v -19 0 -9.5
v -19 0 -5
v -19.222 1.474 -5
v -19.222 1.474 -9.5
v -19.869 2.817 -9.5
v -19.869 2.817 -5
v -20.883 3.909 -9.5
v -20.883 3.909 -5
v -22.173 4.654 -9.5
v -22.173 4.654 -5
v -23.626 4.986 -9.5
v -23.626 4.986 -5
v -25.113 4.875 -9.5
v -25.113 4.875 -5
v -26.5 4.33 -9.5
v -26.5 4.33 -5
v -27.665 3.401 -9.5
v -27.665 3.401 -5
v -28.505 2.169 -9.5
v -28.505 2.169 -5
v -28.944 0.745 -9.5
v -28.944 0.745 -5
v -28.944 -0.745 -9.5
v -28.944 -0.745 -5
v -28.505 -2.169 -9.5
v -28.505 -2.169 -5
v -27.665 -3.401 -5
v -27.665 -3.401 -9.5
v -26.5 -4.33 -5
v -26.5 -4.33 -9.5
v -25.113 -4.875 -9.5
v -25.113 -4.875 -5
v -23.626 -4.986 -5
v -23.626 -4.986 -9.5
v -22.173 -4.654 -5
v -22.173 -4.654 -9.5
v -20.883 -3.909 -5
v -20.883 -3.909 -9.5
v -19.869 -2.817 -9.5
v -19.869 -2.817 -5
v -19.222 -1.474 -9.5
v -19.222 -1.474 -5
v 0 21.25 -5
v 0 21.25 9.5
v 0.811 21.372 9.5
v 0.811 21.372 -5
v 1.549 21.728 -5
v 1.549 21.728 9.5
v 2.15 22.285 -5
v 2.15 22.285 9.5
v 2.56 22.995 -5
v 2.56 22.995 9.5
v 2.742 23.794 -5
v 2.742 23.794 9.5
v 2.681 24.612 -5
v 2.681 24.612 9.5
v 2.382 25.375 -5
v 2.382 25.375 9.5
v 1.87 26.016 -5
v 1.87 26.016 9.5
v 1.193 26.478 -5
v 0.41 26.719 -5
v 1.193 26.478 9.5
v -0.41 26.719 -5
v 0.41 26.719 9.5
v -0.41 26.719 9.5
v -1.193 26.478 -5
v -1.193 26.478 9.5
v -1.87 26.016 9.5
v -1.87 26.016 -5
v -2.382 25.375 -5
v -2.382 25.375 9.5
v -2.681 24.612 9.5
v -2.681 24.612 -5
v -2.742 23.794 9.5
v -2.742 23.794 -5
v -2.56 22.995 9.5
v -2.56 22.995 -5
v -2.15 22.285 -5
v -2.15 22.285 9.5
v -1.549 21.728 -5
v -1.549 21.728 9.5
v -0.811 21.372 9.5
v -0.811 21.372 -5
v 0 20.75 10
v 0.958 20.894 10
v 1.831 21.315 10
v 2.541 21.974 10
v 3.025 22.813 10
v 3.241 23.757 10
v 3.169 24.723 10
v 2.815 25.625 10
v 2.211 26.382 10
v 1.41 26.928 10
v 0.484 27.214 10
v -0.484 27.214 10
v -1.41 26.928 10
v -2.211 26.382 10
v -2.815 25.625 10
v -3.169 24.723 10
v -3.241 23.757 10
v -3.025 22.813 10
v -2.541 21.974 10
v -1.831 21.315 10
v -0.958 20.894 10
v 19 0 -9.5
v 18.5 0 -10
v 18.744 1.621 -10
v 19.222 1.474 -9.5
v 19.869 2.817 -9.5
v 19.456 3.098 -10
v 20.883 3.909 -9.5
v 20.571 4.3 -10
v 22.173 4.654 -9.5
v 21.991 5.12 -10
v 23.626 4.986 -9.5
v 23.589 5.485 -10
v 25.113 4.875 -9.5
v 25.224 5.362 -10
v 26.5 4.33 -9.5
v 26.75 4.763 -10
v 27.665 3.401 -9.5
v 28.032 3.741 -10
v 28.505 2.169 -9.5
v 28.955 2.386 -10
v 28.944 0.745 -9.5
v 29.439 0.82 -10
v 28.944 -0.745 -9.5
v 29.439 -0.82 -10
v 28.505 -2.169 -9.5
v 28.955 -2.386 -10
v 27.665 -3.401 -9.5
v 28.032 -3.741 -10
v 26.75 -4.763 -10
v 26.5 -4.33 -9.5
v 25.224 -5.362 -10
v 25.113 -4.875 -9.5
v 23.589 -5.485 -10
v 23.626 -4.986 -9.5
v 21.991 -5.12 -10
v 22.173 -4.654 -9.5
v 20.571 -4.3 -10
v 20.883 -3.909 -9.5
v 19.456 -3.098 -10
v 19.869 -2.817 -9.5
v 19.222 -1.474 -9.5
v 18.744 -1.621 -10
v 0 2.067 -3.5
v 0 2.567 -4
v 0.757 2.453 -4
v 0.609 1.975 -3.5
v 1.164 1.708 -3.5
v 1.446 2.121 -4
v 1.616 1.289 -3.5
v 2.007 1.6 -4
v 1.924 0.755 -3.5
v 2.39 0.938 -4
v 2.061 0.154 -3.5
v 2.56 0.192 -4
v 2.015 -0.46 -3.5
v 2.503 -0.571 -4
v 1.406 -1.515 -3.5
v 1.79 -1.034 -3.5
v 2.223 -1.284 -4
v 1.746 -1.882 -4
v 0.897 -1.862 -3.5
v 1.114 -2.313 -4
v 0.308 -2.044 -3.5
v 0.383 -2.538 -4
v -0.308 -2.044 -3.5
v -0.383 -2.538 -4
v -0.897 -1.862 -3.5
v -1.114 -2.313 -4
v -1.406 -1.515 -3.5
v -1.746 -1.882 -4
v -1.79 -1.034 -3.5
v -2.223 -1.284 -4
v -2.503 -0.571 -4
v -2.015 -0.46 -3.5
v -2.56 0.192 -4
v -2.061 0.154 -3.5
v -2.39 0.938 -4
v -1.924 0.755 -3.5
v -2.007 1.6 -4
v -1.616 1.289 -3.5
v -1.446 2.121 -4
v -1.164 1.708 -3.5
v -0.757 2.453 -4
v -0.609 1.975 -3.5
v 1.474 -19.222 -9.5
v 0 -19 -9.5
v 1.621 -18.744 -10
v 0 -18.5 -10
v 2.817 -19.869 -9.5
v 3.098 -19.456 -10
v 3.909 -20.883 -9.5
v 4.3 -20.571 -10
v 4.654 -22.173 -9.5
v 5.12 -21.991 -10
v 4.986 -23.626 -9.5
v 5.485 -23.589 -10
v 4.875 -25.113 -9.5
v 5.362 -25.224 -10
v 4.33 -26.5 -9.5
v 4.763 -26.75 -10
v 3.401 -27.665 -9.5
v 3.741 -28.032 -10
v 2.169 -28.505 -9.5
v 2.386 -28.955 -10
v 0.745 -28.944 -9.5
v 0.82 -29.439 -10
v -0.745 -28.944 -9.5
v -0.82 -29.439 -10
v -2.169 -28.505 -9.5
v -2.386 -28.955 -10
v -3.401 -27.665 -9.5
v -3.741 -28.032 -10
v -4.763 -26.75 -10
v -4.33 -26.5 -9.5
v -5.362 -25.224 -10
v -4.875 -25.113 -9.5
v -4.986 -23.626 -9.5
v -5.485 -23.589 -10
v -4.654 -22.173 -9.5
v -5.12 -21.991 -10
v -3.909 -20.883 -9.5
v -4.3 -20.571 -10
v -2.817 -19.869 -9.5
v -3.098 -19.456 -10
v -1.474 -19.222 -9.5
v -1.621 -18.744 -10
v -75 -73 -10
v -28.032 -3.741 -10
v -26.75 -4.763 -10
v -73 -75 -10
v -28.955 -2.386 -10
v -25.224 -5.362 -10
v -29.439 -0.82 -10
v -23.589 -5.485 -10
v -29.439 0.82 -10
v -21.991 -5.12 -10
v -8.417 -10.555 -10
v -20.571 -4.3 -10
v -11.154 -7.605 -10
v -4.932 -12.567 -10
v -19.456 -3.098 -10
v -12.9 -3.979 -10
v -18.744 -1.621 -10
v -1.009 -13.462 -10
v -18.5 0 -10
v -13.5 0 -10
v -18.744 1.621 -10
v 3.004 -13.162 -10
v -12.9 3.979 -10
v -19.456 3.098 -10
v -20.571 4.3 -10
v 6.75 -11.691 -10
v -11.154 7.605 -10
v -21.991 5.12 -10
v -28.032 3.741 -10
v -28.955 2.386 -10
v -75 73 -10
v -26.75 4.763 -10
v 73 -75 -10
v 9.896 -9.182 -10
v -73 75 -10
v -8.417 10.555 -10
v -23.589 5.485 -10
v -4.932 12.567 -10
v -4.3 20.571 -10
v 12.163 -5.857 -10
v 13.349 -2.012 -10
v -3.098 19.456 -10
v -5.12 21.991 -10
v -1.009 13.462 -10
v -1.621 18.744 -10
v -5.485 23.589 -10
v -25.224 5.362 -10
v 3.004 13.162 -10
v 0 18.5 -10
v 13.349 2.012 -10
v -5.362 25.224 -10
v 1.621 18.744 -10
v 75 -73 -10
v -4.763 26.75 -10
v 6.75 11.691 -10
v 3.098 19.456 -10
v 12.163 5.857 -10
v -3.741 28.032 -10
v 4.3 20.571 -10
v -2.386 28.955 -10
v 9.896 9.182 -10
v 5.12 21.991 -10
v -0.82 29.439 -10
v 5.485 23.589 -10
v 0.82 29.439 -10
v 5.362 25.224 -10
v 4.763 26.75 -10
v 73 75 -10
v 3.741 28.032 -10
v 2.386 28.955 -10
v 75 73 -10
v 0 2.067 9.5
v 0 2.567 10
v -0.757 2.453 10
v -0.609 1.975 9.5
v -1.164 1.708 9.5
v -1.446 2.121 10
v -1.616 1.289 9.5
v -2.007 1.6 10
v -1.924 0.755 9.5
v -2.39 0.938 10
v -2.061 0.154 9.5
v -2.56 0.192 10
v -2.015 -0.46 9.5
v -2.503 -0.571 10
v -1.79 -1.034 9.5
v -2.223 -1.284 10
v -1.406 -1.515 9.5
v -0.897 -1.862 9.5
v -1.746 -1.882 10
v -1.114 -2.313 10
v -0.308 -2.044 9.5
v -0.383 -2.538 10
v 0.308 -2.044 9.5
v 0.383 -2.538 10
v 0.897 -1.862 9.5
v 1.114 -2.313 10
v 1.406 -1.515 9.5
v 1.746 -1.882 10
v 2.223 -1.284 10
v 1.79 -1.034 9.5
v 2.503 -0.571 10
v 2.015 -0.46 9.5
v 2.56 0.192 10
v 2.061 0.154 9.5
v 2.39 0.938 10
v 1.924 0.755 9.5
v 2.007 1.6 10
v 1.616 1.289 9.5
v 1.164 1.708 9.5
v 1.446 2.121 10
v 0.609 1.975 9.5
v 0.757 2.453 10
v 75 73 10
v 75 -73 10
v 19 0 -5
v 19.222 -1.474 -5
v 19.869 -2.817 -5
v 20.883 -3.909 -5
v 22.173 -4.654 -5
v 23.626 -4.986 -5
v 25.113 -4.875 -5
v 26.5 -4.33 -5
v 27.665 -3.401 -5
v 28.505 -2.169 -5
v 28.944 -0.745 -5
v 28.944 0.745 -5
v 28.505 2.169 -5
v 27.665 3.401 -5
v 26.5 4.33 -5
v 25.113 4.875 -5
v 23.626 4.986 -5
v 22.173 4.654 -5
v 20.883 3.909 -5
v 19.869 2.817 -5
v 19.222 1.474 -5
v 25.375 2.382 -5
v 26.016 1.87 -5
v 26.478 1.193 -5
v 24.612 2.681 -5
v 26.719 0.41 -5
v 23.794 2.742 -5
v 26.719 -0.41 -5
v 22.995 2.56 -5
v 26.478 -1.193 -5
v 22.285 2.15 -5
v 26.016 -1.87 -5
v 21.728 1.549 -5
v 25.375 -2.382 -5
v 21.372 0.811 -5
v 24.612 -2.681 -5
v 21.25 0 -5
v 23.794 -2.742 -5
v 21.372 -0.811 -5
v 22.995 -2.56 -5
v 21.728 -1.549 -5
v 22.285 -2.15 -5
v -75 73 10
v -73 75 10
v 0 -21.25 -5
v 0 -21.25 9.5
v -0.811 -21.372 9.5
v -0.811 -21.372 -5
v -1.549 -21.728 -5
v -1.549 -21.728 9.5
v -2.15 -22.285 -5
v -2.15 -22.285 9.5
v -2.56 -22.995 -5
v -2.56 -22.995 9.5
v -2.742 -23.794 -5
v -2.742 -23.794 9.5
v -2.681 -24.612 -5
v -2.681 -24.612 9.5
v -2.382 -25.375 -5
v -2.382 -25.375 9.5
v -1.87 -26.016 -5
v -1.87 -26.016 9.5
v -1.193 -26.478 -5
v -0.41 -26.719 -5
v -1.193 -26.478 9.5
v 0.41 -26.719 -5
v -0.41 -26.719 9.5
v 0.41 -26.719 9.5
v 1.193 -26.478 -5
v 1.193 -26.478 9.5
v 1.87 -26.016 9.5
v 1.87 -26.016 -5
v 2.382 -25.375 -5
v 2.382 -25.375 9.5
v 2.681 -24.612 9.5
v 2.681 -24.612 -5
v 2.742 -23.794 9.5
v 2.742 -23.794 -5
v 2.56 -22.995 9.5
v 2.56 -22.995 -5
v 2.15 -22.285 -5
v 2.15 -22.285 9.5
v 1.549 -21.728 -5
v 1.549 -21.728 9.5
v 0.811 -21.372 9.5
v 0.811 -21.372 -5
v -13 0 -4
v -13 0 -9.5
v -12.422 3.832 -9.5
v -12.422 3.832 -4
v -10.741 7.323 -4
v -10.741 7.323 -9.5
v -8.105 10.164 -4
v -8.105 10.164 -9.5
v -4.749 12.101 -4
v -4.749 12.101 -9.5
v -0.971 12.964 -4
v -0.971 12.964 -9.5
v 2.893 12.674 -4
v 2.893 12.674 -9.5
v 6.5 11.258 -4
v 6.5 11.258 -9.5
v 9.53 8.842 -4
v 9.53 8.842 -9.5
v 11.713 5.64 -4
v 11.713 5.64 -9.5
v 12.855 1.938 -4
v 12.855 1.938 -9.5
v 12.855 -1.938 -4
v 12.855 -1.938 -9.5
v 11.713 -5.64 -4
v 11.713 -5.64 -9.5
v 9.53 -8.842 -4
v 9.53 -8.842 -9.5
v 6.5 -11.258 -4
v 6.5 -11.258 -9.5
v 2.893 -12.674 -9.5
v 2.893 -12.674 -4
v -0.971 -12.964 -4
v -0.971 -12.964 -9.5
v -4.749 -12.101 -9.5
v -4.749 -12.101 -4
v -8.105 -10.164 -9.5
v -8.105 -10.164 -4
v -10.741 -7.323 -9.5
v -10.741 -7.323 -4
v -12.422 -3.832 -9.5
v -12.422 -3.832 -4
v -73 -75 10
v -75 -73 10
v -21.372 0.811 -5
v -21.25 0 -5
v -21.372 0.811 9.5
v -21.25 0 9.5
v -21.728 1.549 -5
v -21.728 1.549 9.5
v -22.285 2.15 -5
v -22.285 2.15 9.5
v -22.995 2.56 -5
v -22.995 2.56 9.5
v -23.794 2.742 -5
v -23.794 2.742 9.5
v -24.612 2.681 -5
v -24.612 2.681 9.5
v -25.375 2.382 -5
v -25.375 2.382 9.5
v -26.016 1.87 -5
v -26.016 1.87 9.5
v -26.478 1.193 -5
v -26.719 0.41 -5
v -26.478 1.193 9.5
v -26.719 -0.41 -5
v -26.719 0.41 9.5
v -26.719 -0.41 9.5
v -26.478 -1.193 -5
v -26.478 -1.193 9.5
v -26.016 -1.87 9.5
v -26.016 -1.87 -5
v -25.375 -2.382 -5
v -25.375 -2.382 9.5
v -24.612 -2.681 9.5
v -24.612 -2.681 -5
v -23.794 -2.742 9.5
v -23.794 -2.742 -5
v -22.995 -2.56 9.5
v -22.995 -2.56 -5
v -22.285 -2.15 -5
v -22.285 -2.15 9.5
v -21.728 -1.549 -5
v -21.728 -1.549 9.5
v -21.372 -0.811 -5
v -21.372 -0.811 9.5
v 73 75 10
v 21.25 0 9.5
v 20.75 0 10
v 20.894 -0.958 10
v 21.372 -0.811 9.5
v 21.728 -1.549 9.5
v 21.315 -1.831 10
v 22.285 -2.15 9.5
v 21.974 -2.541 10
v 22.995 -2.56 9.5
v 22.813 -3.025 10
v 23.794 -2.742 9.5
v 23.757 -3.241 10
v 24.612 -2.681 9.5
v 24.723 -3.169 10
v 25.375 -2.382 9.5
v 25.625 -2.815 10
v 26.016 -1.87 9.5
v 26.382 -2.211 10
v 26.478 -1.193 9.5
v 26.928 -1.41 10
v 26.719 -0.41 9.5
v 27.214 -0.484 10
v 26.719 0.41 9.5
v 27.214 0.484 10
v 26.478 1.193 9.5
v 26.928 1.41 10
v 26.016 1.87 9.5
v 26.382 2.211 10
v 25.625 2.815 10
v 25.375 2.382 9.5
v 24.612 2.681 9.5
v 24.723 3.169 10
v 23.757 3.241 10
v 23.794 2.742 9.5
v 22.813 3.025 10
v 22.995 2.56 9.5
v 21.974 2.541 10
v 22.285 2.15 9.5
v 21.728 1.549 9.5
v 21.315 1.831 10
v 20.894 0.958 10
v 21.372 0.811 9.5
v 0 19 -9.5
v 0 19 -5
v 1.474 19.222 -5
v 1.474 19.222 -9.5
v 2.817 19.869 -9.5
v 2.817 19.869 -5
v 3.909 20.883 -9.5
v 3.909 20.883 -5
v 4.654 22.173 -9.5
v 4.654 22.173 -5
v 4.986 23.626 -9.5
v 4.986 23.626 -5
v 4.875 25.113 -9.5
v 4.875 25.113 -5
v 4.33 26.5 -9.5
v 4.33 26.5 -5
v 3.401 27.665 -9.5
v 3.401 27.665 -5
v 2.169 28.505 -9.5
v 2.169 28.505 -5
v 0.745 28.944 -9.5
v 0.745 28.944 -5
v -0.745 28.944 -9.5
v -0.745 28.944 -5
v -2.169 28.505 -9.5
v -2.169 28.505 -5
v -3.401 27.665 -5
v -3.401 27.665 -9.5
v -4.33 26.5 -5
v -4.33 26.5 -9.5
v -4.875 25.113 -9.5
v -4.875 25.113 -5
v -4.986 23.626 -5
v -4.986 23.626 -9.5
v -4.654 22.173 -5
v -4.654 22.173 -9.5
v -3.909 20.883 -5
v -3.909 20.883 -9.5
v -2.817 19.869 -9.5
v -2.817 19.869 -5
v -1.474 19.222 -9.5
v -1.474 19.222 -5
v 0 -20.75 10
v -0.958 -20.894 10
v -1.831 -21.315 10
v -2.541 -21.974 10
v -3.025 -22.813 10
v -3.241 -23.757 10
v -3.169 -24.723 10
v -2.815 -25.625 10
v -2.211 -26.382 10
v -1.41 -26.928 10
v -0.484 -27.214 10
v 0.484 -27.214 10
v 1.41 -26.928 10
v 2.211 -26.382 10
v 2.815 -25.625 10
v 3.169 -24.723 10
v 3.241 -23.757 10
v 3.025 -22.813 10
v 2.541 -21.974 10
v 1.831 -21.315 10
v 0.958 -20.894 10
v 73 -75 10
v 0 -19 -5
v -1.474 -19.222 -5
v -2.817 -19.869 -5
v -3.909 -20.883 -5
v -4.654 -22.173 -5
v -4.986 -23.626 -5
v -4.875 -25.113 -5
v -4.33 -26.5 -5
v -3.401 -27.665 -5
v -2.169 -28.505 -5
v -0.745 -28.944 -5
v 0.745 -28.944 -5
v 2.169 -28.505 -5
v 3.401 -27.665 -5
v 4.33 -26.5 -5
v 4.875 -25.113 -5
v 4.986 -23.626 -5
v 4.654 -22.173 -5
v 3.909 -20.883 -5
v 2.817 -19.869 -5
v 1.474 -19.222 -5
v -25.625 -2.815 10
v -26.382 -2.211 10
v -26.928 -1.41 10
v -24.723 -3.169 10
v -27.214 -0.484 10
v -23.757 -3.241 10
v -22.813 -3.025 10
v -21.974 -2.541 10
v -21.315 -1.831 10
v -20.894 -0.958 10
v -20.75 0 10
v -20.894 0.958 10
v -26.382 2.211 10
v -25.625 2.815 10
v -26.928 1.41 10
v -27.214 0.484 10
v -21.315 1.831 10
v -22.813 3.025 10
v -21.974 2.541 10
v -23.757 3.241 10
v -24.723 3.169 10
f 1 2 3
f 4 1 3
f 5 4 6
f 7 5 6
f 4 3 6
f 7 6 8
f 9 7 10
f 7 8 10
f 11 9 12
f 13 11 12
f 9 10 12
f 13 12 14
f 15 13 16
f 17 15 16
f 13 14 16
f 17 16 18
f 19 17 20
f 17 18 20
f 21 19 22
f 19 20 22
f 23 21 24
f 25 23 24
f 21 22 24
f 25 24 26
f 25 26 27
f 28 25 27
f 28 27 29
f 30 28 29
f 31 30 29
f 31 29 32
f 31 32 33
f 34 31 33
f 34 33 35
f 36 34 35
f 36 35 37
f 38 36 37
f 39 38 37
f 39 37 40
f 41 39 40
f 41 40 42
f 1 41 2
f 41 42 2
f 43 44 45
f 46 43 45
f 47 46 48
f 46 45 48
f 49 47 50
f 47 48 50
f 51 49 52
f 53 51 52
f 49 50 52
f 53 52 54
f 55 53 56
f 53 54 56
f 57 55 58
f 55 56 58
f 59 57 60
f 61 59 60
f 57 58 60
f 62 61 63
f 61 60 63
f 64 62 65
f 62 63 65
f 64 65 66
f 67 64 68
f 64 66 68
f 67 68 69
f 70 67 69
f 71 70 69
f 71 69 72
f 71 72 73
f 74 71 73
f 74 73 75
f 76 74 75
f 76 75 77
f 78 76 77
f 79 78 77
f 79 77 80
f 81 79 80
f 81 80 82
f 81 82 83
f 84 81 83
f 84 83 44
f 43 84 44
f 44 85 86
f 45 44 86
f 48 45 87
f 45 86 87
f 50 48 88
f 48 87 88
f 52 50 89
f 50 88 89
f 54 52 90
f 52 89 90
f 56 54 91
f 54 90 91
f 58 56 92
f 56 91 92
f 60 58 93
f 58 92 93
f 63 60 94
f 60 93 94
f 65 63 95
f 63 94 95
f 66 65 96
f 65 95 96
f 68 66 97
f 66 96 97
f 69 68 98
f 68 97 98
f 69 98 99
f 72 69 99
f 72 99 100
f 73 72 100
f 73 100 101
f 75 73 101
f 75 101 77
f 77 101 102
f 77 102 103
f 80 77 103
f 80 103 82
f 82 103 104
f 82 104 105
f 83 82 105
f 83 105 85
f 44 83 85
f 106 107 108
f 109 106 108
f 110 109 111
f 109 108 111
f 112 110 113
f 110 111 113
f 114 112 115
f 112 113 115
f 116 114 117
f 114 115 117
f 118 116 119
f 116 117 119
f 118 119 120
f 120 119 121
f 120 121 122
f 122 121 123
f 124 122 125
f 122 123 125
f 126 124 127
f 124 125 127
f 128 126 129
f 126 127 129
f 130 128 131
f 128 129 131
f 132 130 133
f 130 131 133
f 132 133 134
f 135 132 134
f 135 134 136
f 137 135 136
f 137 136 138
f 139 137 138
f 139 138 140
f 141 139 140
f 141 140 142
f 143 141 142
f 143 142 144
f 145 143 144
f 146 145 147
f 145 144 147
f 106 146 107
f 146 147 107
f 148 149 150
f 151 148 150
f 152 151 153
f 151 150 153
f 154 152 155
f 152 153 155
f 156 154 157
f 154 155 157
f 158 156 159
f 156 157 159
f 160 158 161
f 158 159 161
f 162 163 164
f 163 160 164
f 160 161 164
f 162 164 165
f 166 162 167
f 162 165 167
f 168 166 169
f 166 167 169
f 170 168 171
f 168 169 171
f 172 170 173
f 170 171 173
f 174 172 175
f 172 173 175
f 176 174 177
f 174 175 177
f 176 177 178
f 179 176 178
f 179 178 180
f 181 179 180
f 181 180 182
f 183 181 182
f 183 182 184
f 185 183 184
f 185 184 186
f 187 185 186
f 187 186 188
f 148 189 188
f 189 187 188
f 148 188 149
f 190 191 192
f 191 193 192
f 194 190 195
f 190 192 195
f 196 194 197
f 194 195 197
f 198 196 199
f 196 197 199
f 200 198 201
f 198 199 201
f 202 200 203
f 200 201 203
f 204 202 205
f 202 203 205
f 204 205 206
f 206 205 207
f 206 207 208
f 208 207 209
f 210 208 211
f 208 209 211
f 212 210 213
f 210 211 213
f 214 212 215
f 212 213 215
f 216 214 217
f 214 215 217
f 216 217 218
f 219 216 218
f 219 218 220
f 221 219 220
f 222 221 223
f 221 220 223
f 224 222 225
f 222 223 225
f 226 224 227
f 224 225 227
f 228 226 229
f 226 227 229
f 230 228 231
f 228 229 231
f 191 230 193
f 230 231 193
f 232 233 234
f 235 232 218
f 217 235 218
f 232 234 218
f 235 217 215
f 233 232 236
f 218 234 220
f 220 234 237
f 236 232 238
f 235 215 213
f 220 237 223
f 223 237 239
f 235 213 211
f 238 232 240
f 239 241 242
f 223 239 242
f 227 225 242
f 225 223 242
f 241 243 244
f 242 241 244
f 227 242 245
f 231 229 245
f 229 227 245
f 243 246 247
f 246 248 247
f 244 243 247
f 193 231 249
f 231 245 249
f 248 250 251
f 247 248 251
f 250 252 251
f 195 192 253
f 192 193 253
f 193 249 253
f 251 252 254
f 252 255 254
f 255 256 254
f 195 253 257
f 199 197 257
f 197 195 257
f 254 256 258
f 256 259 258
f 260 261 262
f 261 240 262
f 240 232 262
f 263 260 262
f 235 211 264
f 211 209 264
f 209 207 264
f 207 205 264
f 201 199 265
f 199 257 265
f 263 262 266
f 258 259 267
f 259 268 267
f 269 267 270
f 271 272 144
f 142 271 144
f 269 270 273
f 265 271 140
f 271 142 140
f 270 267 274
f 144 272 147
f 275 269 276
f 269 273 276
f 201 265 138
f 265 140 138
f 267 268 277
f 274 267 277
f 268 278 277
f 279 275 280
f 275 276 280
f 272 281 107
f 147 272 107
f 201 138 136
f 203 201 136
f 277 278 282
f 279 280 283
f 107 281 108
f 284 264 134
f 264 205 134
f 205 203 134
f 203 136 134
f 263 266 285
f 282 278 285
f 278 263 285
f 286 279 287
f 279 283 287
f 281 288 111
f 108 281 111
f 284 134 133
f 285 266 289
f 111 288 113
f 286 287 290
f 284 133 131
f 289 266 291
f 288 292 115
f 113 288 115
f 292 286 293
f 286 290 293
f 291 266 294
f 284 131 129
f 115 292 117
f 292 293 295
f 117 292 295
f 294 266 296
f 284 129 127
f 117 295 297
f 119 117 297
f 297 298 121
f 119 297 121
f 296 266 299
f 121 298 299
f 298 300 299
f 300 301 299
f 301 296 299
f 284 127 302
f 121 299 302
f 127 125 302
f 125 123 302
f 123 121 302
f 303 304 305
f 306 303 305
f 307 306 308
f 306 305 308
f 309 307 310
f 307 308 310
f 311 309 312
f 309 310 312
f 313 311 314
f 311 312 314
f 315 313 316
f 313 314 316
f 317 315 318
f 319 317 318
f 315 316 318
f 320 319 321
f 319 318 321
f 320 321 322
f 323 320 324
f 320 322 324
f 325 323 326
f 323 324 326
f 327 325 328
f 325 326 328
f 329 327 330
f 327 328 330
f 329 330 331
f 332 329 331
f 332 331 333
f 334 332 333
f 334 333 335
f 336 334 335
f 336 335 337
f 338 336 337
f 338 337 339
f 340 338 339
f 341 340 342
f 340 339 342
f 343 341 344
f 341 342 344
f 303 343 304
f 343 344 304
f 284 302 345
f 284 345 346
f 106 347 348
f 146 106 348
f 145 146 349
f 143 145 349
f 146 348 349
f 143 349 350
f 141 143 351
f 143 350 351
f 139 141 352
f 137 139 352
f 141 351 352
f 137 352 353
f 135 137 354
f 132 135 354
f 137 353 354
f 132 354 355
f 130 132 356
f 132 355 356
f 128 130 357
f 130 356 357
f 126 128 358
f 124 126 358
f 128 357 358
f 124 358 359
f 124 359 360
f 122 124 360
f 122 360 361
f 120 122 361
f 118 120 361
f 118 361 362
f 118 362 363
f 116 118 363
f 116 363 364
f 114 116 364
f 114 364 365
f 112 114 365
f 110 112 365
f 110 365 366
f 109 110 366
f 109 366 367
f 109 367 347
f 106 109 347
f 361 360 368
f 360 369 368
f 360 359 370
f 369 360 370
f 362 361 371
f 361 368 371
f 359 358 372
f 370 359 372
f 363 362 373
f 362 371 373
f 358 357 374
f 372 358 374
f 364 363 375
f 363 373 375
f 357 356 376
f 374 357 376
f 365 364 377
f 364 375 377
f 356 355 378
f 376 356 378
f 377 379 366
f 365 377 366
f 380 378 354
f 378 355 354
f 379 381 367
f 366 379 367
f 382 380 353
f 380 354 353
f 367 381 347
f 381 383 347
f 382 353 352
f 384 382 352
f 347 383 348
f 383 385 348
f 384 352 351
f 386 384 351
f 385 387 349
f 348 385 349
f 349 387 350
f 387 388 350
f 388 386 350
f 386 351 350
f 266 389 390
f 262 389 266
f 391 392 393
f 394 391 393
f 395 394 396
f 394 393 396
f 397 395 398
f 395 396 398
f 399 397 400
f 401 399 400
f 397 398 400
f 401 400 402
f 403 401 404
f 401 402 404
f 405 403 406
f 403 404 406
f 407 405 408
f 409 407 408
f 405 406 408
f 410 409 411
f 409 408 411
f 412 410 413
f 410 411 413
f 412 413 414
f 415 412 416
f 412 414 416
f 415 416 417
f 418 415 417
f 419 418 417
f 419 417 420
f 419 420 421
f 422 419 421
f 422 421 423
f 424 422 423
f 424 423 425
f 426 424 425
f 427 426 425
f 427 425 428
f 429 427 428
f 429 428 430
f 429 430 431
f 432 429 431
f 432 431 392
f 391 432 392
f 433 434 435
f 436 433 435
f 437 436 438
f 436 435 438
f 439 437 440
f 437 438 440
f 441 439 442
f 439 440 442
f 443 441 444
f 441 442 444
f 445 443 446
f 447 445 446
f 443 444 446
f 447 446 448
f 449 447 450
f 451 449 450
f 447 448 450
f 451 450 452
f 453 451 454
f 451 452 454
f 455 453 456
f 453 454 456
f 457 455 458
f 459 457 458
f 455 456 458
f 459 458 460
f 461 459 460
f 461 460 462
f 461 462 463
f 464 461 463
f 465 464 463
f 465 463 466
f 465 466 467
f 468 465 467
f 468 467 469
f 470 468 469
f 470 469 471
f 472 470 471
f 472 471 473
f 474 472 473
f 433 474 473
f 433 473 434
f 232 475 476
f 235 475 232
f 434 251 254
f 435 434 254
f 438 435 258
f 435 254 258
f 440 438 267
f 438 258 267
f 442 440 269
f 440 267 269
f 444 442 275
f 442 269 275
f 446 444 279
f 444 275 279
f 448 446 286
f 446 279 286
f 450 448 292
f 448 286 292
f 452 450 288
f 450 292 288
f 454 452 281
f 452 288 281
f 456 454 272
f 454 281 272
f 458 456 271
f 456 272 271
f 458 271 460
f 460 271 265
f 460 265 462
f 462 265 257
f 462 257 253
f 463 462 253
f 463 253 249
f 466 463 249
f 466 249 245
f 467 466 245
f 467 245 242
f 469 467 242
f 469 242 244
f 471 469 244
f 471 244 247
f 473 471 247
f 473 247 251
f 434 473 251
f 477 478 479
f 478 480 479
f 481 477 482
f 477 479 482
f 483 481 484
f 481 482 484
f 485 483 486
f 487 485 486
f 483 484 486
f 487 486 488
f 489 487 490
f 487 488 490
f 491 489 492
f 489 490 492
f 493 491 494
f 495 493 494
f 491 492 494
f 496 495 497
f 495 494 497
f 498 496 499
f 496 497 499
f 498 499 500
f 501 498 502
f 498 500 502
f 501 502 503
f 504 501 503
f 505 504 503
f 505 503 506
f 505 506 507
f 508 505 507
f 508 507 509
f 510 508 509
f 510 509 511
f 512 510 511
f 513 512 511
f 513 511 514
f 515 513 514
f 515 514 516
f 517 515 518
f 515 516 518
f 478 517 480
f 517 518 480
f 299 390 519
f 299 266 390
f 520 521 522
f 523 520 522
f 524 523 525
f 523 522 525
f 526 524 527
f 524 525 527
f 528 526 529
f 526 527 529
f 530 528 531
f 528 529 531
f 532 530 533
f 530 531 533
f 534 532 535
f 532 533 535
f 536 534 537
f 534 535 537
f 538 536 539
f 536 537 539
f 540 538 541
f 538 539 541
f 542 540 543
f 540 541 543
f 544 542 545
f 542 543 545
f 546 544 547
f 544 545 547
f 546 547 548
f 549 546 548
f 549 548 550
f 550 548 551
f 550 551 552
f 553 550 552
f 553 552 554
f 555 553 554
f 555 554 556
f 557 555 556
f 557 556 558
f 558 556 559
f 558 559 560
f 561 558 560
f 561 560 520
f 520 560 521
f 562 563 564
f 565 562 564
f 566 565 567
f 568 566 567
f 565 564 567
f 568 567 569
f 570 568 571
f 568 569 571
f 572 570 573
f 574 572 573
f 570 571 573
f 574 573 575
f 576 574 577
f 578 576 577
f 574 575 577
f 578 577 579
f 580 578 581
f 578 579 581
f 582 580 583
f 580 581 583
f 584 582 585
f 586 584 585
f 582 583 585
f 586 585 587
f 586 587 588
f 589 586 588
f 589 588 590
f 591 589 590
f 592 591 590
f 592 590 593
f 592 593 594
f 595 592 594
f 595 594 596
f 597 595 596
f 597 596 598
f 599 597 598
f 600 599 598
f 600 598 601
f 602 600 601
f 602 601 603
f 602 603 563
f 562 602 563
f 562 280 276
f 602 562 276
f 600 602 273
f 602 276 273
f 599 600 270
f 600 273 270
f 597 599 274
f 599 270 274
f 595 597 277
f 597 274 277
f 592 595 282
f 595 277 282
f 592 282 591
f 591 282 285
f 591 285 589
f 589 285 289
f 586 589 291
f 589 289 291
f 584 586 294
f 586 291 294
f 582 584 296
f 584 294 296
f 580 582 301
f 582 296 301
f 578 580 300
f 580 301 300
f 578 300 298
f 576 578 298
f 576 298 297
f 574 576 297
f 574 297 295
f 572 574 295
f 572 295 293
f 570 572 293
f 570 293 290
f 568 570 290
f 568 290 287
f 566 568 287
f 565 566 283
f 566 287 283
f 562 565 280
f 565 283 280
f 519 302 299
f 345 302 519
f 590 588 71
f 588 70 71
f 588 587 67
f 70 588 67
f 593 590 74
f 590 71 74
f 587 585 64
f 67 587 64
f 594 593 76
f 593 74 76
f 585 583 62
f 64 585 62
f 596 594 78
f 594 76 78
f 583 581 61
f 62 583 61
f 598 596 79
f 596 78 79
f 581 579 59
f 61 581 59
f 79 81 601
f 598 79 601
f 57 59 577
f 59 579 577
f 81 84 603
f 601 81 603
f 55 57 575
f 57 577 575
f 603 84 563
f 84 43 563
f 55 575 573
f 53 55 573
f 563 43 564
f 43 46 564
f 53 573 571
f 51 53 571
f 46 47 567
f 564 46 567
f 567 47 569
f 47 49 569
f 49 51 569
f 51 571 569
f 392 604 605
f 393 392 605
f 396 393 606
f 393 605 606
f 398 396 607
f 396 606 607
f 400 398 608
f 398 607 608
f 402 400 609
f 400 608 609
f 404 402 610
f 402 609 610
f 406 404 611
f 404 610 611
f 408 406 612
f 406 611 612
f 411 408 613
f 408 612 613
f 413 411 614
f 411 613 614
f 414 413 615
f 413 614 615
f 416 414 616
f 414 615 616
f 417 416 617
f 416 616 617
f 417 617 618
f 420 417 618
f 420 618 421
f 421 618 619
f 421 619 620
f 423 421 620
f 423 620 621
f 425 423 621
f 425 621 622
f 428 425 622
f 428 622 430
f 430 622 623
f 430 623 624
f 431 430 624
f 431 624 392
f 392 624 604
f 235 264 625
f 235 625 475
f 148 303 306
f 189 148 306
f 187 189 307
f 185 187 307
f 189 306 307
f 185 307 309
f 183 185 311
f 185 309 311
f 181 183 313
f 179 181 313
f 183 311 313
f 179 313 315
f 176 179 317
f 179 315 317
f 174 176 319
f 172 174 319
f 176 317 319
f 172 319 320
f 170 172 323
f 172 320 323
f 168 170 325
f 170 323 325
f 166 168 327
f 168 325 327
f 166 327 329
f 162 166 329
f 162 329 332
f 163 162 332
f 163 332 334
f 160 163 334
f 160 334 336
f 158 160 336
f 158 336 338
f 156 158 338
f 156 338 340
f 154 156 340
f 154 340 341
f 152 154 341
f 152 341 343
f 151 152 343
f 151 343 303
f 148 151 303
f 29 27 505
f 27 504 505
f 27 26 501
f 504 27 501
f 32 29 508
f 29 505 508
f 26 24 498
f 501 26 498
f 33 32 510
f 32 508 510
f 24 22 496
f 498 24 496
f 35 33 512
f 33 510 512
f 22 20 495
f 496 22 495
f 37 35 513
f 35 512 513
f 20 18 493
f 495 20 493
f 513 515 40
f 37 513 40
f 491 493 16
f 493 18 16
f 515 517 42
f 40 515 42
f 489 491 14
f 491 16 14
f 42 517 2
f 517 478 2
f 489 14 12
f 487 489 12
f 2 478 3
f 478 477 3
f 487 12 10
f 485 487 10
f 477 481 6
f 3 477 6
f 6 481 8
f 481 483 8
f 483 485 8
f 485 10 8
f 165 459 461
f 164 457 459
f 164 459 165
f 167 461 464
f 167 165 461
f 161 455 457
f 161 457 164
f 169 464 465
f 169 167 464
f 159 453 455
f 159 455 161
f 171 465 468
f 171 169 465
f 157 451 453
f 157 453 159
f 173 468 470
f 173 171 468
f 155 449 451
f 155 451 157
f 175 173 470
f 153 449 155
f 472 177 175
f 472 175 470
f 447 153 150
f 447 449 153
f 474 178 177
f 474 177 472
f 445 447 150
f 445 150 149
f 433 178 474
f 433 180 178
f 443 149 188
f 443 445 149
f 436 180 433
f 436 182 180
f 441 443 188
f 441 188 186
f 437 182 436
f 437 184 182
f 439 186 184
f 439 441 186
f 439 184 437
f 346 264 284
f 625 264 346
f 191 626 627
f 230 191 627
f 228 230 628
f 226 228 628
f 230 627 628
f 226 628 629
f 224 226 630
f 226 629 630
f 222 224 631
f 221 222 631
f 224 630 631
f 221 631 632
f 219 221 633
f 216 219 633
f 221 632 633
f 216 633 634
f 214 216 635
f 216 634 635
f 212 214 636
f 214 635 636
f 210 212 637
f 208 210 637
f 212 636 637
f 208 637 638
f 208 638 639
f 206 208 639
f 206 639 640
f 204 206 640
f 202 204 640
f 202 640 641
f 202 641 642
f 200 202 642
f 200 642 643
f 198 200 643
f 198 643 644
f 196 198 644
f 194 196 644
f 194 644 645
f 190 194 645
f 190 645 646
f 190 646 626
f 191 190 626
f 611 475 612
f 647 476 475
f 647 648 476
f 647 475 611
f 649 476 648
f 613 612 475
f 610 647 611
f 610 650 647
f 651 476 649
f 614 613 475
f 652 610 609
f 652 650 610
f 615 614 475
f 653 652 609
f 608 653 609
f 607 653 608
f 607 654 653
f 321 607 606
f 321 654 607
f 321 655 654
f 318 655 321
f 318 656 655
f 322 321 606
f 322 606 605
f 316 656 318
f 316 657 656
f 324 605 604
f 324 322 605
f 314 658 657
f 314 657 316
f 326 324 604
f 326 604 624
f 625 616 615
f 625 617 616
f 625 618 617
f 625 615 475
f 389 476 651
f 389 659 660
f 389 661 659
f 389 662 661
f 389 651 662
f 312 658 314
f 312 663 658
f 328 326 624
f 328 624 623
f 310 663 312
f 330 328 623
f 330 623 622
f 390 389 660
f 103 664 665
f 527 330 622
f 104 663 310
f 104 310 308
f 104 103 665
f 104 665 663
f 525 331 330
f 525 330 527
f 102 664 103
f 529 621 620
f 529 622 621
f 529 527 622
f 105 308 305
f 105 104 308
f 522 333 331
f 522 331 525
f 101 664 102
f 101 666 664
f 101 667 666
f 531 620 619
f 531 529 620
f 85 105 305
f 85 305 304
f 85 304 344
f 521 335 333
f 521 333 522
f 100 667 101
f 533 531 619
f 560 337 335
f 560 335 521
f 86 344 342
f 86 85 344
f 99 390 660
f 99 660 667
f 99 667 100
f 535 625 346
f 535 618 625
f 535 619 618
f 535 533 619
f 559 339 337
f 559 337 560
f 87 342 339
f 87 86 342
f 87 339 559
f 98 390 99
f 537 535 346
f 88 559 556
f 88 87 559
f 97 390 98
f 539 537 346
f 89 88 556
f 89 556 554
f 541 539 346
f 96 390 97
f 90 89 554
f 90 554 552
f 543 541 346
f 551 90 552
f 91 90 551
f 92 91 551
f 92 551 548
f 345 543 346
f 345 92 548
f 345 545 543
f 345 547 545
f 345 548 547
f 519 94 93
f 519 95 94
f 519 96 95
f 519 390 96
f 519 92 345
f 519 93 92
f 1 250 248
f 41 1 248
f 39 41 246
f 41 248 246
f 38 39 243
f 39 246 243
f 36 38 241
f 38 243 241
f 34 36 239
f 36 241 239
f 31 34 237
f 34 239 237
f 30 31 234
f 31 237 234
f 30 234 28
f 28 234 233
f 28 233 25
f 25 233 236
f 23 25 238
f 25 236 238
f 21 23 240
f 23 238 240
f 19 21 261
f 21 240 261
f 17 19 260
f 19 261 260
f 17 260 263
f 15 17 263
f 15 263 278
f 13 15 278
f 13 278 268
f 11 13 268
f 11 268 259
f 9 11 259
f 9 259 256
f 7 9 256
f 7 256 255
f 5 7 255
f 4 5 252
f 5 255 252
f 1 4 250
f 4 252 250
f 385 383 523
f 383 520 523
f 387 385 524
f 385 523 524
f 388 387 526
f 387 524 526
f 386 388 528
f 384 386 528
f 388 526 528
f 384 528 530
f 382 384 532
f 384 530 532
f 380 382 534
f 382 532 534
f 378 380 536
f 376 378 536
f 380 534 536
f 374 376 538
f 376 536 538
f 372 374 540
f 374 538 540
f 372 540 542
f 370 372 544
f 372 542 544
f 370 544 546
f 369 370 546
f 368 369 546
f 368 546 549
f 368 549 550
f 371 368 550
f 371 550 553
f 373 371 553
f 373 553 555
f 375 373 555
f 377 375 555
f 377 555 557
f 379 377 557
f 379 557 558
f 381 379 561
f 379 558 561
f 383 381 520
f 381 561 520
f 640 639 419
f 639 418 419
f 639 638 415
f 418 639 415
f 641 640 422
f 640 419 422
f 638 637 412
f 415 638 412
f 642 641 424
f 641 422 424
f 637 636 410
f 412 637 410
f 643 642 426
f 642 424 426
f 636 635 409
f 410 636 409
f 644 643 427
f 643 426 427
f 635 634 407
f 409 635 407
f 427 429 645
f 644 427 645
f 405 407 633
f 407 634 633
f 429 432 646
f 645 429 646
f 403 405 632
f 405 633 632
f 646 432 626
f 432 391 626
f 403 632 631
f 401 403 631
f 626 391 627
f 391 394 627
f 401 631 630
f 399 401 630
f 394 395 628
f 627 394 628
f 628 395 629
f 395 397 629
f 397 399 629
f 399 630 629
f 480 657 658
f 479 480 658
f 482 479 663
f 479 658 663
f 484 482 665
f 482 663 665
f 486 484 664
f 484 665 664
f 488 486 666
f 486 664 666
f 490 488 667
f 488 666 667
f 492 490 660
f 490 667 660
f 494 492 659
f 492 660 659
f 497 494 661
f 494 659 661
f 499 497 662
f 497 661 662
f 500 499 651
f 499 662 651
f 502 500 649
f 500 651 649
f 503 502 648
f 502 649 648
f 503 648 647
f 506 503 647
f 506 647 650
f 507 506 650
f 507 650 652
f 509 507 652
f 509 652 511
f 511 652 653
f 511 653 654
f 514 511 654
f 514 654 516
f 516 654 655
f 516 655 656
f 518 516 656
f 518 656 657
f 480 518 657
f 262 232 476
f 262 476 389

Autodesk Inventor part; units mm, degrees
ref_plane "XY Plane" through (0, 0, 0) normal (0, 0, 1) x (1, 0, 0)
sketch "Skizze1" plane through (0, 0, 0) normal (0, 0, 1) x (1, 0, 0)
  line L0 (-75, 75) -> (75, 75)
  line L1 (75, 75) -> (75, -75)
  line L2 (75, -75) -> (-75, -75)
  line L3 (-75, -75) -> (-75, 75)
  line L4 (-75, 75) -> (75, -75) construction
  line L5 (75, 75) -> (-75, -75) construction
  point P0 (0, 0)
  dimension "d0" = 150
  dimension "d1" = 150
extrude "Extrusion1" add sketch "Skizze1" along normal mid plane 20
sketch "Skizze5" plane through (0, 0, -10) normal (0, 0, -1) x (-1, 0, 0)
  line L0 (-75, -75) -> (75, -75) projected
  line L1 (75, -75) -> (75, 75) projected
  line L2 (75, 75) -> (-75, 75) projected
  line L3 (-75, 75) -> (-75, -75) projected
  circle A0 centre (0, 0) radius 13
  dimension "d30" = 26
extrude "Extrusion3" cut sketch "Skizze5" against normal blind 6 contours A0
chamfer "Fasen2" distance 2 angle 45 4 edges at (-75, -75, 0) (75, -75, 0) (-75, 75, 0) (75, 75, 0)
chamfer "Fasen3" distance 0.5 angle 45 1 edges at (13, 0, -10)
sketch "Skizze6" plane through (0, 0, -4) normal (0, 0, -1) x (-1, 0, 0)
  circle A0 centre (0, 0) radius 13 projected
hole "Bohrung3" at (0, 0, -4) direction (0, 0, 1) diameter 4.134 end through all thread size "M5x0.8" class "6H" standard "ISO Metric profile"
sketch "Skizze7" plane through (0, 0, -10) normal (0, 0, -1) x (-1, 0, 0)
  line L0 (-75, 73) -> (-73, 75) projected
  line L1 (-75, 73) -> (-75, -73) projected
  line L2 (-73, -75) -> (-75, -73) projected
  line L3 (-73, -75) -> (73, -75) projected
  line L4 (75, -73) -> (73, -75) projected
  line L5 (75, -73) -> (75, 73) projected
  line L6 (73, 75) -> (75, 73) projected
  line L7 (73, 75) -> (-73, 75) projected
  circle A0 centre (0, 0) radius 13.5 projected
  point P0 (0, -24)
  dimension "d46" = 24
  dimension "d47" = 0
hole "Bohrung4" at (0, -24, -10) direction (0, 0, 1) diameter 5.5 end through all counterbore diameter 10 counterbore depth 5
pattern_circular "Runde Anordnung2" count 4 over 360 about axis through (0, 0, -10) along (0, 0, 1) of "Bohrung4"
chamfer "Fasen4" distance 0.5 angle 45 4 edges at (0, -29, -10) (29, 0, -10) (0, 29, -10) (-29, 0, -10)
chamfer "Fasen5" distance 0.5 angle 45 4 edges at (26.75, 0, 10) (0, 26.75, 10) (-26.75, 0, 10) (0, -26.75, 10)
chamfer "Fasen6" distance 0.5 angle 45 1 edges at (0, -2.067, 10)
chamfer "Fasen7" distance 0.5 angle 45 1 edges at (0, -2.067, -4)
properties part number "Koordinaten-Platte"
